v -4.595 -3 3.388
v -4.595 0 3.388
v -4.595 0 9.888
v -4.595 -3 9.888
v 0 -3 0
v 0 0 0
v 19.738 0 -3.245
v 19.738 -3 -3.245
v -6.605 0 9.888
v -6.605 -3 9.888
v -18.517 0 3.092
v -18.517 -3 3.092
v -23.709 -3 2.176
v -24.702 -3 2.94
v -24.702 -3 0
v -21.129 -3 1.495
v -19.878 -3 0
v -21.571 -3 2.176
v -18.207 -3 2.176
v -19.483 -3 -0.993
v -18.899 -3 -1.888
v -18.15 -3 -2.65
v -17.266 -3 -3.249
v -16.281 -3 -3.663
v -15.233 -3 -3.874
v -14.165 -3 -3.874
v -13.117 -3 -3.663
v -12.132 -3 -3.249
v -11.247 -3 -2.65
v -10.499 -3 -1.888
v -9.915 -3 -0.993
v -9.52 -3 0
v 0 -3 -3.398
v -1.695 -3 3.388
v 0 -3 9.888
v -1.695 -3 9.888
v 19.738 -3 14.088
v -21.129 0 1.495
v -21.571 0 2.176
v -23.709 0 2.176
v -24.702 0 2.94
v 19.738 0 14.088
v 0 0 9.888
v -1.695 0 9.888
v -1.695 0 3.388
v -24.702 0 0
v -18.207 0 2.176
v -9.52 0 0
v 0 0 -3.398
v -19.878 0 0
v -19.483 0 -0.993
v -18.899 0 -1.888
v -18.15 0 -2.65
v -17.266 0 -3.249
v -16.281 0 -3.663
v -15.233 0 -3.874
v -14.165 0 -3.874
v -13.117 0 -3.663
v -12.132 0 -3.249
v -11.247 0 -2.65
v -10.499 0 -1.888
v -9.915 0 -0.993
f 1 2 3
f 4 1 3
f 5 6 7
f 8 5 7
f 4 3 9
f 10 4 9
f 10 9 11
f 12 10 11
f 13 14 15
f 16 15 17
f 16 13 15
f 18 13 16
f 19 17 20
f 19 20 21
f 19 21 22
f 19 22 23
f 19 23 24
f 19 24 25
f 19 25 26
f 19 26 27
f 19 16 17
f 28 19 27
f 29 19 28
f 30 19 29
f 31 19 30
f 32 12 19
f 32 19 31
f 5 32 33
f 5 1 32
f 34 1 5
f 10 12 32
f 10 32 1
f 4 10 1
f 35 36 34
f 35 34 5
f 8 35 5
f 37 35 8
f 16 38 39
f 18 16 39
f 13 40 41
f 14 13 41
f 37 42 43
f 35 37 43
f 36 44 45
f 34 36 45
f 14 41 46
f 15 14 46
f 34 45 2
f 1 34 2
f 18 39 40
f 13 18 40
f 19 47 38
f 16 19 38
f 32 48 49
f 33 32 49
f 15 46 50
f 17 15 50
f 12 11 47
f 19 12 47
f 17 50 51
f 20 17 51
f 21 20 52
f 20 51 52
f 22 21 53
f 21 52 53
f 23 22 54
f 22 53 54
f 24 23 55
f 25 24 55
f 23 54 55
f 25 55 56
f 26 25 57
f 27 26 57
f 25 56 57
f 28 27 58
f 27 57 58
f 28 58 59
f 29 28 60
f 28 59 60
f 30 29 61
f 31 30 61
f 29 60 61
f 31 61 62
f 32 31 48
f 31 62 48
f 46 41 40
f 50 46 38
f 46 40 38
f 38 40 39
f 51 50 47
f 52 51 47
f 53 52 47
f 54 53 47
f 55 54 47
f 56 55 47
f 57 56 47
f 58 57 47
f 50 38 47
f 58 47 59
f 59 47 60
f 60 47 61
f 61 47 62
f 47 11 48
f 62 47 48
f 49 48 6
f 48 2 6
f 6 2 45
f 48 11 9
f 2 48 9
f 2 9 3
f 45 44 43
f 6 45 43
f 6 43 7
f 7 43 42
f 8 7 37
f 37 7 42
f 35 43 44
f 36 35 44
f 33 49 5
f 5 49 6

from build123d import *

# Parameters (mm, degrees)
F1_DEPTH = 3
F2_DEPTH = 3


with BuildPart() as f1:
    # F0 (on Front) → F1 (new body)
    with BuildSketch(Plane.XZ):
        with BuildLine():
            Line((-24.701704, 2.93977), (-24.701704, 0))
            Line((-24.701704, 0), (-21.494682, 0))
            Line((-21.494682, 0), (-19.878102, 0))
            ThreePointArc((-19.878102, 0), (-14.698851, -3.900059), (-9.519599, 0))
            Line((-9.519599, 0), (0, -3.397916))
            Line((0, -3.397916), (0, 0))
            Line((0, 0), (19.738455, -3.245201))
            Line((19.738455, -3.245201), (19.738455, 14.08799))
            Line((19.738455, 14.08799), (0, 9.888318))
            Line((0, 9.888318), (-1.695249, 9.888318))
            Line((-1.695249, 9.888318), (-1.695249, 3.388318))
            Line((-1.695249, 3.388318), (-4.595249, 3.388318))
            Line((-4.595249, 3.388318), (-4.595249, 9.888318))
            Line((-4.595249, 9.888318), (-6.604938, 9.888318))
            Line((-6.604938, 9.888318), (-18.516734, 3.092485))
            Line((-18.516734, 3.092485), (-18.207028, 2.176193))
            Line((-18.207028, 2.176193), (-21.128689, 1.495096))
            Line((-21.128689, 1.495096), (-21.57104, 2.176193))
            Line((-21.57104, 2.176193), (-23.709055, 2.176193))
            Line((-23.709055, 2.176193), (-24.701704, 2.93977))
        make_face()
    extrude(amount=F1_DEPTH)

    # F0 (on Front) → F2 (join)
    with BuildSketch(Plane.XZ):
        with BuildLine():
            Line((-24.701704, 2.93977), (-24.701704, 0))
            Line((-24.701704, 0), (-21.494682, 0))
            Line((-21.494682, 0), (-19.878102, 0))
            ThreePointArc((-19.878102, 0), (-14.698851, -3.900059), (-9.519599, 0))
            Line((-9.519599, 0), (0, -3.397916))
            Line((0, -3.397916), (0, 0))
            Line((0, 0), (19.738455, -3.245201))
            Line((19.738455, -3.245201), (19.738455, 14.08799))
            Line((19.738455, 14.08799), (0, 9.888318))
            Line((0, 9.888318), (-1.695249, 9.888318))
            Line((-1.695249, 9.888318), (-1.695249, 3.388318))
            Line((-1.695249, 3.388318), (-4.595249, 3.388318))
            Line((-4.595249, 3.388318), (-4.595249, 9.888318))
            Line((-4.595249, 9.888318), (-6.604938, 9.888318))
            Line((-6.604938, 9.888318), (-18.516734, 3.092485))
            Line((-18.516734, 3.092485), (-18.207028, 2.176193))
            Line((-18.207028, 2.176193), (-21.128689, 1.495096))
            Line((-21.128689, 1.495096), (-21.57104, 2.176193))
            Line((-21.57104, 2.176193), (-23.709055, 2.176193))
            Line((-23.709055, 2.176193), (-24.701704, 2.93977))
        make_face()
    extrude(amount=F2_DEPTH)


solid = f1.part
